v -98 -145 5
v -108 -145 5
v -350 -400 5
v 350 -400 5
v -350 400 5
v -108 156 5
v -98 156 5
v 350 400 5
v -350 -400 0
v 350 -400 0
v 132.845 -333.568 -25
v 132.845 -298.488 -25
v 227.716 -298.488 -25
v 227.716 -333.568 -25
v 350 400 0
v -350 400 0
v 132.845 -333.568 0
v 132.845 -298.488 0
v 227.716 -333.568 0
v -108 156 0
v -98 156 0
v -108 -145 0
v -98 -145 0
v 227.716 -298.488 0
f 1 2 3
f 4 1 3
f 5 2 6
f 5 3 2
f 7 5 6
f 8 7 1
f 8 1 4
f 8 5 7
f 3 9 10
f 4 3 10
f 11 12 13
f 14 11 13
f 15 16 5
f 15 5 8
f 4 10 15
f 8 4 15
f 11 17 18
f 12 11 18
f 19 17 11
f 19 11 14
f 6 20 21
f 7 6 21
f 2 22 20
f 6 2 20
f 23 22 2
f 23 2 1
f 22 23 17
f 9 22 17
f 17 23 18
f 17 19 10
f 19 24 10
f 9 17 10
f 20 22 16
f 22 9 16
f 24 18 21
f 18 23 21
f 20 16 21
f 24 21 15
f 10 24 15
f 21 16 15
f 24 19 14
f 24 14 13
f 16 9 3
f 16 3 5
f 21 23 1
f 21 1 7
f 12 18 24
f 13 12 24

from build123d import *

# Parameters (mm, degrees)
F0_W     = 700
F0_H     = 800
F0_W_2   = 10
F0_H_2   = 301
F1_DEPTH = 5
F2_W     = 94.870865
F2_H     = 35.080195
F3_DEPTH = 25


with BuildPart() as f1:
    # F0 (on Top) → F1 (new body)
    with BuildSketch(Plane.XY):
        Rectangle(F0_W, F0_H)
        with Locations((-103, 5.5)):
            Rectangle(F0_W_2, F0_H_2, mode=Mode.SUBTRACT)
    extrude(amount=F1_DEPTH)

    # F2 (on face) → F3 (join)
    with BuildSketch(Plane.XY):
        with Locations((180.280223, -316.02779)):
            Rectangle(F2_W, F2_H)
    extrude(amount=-F3_DEPTH)


solid = f1.part
